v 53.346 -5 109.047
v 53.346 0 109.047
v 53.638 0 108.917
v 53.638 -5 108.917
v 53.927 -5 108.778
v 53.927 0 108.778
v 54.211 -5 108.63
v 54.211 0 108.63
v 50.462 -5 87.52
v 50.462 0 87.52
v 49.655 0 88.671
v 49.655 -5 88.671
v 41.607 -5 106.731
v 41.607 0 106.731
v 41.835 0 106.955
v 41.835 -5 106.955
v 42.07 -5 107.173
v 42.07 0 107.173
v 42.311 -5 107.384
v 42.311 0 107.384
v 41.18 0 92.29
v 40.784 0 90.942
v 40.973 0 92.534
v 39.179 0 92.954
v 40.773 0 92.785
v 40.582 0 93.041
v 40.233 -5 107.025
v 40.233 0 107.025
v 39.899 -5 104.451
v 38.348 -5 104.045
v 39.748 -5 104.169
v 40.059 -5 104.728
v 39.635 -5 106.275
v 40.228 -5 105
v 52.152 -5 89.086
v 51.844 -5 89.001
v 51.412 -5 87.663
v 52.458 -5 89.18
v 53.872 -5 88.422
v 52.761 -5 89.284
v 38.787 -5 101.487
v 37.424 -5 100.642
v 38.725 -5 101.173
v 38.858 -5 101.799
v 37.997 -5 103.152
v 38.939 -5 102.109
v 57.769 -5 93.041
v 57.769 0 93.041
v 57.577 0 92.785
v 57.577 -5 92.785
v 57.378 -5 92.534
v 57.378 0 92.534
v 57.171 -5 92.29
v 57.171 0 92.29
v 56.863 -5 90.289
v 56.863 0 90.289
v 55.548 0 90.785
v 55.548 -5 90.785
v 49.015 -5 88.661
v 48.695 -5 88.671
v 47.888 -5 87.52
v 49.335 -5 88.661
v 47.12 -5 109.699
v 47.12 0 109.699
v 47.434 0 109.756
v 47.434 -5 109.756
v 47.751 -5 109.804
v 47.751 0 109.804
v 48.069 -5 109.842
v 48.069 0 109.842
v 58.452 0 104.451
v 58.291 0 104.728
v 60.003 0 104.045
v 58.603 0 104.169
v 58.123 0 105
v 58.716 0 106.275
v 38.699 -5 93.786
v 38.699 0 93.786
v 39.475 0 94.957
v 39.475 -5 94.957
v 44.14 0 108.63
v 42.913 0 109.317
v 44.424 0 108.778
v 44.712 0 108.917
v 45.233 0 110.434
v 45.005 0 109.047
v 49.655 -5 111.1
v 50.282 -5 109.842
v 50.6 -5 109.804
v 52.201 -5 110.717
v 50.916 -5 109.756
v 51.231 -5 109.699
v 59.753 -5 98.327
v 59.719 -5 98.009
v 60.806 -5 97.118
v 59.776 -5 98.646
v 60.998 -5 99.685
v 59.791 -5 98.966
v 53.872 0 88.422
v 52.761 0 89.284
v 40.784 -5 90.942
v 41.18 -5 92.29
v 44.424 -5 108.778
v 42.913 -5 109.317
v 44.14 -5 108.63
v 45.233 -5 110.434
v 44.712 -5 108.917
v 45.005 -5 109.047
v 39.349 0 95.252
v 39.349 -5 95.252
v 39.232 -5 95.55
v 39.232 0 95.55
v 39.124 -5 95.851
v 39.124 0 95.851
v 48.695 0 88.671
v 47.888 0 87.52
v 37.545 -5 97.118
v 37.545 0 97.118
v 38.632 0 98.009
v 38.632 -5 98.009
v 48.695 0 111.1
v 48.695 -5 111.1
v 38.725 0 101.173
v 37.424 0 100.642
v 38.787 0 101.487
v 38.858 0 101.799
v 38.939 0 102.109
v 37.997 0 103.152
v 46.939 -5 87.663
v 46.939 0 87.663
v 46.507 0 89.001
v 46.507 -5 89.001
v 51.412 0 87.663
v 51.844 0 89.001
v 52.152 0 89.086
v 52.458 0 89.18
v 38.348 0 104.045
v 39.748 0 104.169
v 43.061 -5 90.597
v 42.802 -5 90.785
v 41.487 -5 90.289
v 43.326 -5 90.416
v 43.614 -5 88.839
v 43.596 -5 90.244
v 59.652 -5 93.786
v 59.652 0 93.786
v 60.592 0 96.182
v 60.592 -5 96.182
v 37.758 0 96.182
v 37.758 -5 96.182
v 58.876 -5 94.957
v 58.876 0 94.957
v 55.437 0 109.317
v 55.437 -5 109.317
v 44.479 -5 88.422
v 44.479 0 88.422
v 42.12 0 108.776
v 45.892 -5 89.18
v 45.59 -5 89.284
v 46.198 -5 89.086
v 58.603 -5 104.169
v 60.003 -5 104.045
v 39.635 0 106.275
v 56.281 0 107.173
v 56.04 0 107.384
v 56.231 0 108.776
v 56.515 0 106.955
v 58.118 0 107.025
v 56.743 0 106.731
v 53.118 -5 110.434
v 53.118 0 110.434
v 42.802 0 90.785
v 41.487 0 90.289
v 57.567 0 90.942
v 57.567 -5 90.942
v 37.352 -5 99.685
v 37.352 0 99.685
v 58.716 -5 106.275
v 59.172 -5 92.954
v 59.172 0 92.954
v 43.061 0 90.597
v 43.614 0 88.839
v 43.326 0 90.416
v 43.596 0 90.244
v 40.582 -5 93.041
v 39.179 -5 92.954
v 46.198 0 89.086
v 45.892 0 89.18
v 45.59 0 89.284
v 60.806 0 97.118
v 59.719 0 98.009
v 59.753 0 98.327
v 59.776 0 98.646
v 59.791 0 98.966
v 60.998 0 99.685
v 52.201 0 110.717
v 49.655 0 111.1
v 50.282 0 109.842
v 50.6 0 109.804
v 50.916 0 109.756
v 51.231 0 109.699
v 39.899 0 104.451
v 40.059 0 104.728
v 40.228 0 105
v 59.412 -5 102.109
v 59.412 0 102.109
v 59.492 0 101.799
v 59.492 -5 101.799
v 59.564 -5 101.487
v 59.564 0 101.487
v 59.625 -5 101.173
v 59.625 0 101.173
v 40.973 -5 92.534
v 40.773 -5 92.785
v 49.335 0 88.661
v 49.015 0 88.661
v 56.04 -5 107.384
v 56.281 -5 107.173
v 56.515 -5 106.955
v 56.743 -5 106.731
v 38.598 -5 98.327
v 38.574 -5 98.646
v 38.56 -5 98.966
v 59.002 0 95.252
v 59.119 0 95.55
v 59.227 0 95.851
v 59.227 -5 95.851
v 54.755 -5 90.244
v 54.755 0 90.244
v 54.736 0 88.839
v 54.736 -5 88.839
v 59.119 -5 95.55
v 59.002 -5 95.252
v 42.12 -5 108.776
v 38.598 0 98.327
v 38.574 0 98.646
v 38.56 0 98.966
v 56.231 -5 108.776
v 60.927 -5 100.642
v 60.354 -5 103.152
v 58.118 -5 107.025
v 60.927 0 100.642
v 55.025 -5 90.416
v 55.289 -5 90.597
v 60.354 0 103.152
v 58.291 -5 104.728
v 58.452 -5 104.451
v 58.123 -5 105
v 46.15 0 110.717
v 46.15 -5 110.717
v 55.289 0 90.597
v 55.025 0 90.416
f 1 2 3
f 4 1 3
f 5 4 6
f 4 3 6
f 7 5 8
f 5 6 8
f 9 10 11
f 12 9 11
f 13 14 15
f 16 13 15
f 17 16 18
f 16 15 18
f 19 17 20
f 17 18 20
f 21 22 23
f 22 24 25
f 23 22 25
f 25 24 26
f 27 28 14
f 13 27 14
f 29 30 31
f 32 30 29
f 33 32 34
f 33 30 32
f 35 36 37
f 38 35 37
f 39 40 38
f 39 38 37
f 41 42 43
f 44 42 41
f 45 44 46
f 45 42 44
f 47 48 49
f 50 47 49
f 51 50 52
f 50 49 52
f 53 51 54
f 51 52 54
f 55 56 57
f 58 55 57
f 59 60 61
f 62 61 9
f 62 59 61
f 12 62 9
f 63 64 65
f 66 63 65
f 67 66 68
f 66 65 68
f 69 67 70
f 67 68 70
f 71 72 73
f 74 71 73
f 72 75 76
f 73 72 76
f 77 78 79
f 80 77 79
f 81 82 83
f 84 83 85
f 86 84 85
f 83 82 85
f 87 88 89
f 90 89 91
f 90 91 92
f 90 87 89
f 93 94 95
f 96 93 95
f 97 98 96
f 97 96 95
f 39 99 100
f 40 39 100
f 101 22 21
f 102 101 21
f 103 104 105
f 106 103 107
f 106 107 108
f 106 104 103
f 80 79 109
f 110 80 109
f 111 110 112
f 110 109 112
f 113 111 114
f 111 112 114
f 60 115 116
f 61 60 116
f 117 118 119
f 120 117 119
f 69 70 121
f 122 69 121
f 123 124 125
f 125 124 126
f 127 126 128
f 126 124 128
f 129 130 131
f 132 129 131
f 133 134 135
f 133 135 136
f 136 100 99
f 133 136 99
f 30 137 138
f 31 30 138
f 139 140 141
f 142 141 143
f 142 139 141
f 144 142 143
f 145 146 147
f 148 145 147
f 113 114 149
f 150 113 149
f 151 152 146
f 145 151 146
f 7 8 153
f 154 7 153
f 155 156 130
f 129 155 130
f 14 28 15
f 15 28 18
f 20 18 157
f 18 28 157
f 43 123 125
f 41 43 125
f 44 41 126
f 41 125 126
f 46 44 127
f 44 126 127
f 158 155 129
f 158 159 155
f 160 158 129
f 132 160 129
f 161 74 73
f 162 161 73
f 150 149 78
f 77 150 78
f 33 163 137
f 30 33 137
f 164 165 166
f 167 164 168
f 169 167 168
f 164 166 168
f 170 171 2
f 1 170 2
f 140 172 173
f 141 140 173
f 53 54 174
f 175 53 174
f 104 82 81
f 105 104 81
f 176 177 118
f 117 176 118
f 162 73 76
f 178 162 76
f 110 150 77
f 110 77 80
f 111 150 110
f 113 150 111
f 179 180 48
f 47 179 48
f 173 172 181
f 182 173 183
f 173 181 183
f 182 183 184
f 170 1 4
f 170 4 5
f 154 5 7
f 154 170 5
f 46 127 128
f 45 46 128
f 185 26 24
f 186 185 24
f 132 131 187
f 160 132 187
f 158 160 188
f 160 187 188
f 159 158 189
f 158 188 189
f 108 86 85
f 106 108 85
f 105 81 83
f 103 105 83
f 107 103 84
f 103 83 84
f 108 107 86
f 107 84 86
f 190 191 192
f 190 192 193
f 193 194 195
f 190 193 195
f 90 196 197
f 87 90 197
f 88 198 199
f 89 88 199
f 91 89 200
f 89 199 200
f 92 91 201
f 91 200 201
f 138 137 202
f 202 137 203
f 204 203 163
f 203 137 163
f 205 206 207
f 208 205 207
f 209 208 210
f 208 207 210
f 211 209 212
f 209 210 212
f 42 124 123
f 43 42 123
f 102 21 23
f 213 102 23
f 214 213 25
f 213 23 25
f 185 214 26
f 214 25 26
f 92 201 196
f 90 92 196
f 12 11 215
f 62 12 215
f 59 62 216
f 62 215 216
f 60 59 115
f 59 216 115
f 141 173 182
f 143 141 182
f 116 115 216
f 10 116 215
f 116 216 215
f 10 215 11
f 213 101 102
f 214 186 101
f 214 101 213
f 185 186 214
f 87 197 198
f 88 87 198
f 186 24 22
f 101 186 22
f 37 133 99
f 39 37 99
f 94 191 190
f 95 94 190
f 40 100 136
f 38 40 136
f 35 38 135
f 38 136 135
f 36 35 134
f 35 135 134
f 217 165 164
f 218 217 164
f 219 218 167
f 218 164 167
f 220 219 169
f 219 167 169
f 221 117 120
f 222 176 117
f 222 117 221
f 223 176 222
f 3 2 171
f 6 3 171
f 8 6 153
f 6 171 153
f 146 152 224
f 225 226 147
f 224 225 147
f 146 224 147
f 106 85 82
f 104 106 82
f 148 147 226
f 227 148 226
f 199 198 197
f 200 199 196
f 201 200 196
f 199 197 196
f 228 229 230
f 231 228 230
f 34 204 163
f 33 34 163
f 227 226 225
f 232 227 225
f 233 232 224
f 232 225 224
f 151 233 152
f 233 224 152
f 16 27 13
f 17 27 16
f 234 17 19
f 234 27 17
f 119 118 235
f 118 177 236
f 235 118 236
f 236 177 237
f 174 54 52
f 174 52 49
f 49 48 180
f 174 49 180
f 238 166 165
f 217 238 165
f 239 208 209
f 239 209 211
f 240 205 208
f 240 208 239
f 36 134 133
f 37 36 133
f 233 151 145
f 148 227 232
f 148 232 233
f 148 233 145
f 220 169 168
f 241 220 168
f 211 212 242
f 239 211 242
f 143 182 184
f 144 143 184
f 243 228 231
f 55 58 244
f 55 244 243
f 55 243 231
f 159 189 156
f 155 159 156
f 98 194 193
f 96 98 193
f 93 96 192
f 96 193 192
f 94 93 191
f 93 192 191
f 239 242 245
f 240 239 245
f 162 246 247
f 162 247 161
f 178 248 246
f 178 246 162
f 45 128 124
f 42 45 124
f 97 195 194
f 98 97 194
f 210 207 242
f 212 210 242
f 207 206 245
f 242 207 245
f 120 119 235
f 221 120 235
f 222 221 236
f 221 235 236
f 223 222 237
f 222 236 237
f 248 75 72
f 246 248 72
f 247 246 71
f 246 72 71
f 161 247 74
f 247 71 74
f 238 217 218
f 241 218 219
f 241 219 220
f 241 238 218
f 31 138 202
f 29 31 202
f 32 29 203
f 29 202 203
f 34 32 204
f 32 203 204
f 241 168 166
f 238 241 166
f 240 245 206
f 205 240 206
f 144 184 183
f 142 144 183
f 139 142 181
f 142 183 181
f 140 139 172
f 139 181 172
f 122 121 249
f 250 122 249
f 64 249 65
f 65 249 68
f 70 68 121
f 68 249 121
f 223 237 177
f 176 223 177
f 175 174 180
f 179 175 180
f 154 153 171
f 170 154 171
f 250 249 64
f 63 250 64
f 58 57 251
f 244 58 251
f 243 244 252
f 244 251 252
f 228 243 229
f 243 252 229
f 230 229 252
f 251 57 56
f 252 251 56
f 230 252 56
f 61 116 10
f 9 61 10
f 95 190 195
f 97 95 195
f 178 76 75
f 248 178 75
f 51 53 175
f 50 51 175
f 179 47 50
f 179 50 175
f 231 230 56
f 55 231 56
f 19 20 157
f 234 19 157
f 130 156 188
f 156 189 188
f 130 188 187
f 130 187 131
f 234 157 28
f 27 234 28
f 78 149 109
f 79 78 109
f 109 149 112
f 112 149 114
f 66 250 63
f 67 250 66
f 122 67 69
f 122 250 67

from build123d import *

# Parameters (mm, degrees)
F1_DEPTH = 5


with BuildPart() as f1:
    # F0 (on Front) → F1 (new body)
    with BuildSketch(Plane.XZ):
        with BuildLine():
            Line((44.479217, 88.422154), (46.939013, 87.663408))
            Line((46.939013, 87.663408), (46.506944, 89.000808))
            ThreePointArc((46.506944, 89.000808), (46.04507, 89.13192), (45.589594, 89.283773))
            Line((45.589594, 89.283773), (44.479217, 88.422154))
        make_face()
        with BuildLine():
            Line((41.487418, 90.288758), (43.614287, 88.838683))
            Line((43.614287, 88.838683), (43.595619, 90.244021))
            ThreePointArc((43.595619, 90.244021), (43.192911, 90.505447), (42.80243, 90.784808))
            Line((42.80243, 90.784808), (41.487418, 90.288758))
        make_face()
        with BuildLine():
            Line((39.178726, 92.954282), (40.783688, 90.941724))
            Line((40.783688, 90.941724), (41.18008, 92.290129))
            ThreePointArc((41.18008, 92.290129), (40.87232, 92.658641), (40.58153, 93.040687))
            Line((40.58153, 93.040687), (39.178726, 92.954282))
        make_face()
        with BuildLine():
            Line((37.758281, 96.181883), (38.698726, 93.785666))
            Line((38.698726, 93.785666), (39.474957, 94.957327))
            ThreePointArc((39.474957, 94.957327), (39.289491, 95.400181), (39.12423, 95.850966))
            Line((39.12423, 95.850966), (37.758281, 96.181883))
        make_face()
        with BuildLine():
            Line((37.352293, 99.684774), (37.544661, 97.117814))
            Line((37.544661, 97.117814), (38.631759, 98.008623))
            ThreePointArc((38.631759, 98.008623), (38.585066, 98.486469), (38.560018, 98.965938))
            Line((38.560018, 98.965938), (37.352293, 99.684774))
        make_face()
        with BuildLine():
            Line((38.939027, 102.108826), (37.996839, 103.151709))
            Line((37.996839, 103.151709), (37.424034, 100.64209))
            Line((37.424034, 100.64209), (38.725407, 101.172895))
            ThreePointArc((38.725407, 101.172895), (38.821636, 101.643275), (38.939027, 102.108826))
        make_face()
        with BuildLine():
            Line((40.227579, 105.000369), (39.634645, 106.274634))
            Line((39.634645, 106.274634), (38.347566, 104.045348))
            Line((38.347566, 104.045348), (39.747579, 104.168984))
            ThreePointArc((39.747579, 104.168984), (39.97818, 104.590103), (40.227579, 105.000369))
        make_face()
        with BuildLine():
            Line((47.888291, 87.520327), (50.462449, 87.520327))
            Line((50.462449, 87.520327), (49.65537, 88.670956))
            ThreePointArc((49.65537, 88.670956), (49.17537, 88.660103), (48.69537, 88.670956))
            Line((48.69537, 88.670956), (47.888291, 87.520327))
        make_face()
        with BuildLine():
            Line((51.411727, 87.663408), (53.871523, 88.422154))
            Line((53.871523, 88.422154), (52.761146, 89.283773))
            ThreePointArc((52.761146, 89.283773), (52.30567, 89.13192), (51.843796, 89.000808))
            Line((51.843796, 89.000808), (51.411727, 87.663408))
        make_face()
        with BuildLine():
            Line((54.736453, 88.838683), (56.863322, 90.288758))
            Line((56.863322, 90.288758), (55.54831, 90.784808))
            ThreePointArc((55.54831, 90.784808), (55.157829, 90.505447), (54.755121, 90.244021))
            Line((54.755121, 90.244021), (54.736453, 88.838683))
        make_face()
        with BuildLine():
            Line((57.567052, 90.941724), (59.172014, 92.954282))
            Line((59.172014, 92.954282), (57.76921, 93.040687))
            ThreePointArc((57.76921, 93.040687), (57.47842, 92.658641), (57.17066, 92.290129))
            Line((57.17066, 92.290129), (57.567052, 90.941724))
        make_face()
        with BuildLine():
            Line((59.652014, 93.785666), (60.59246, 96.181883))
            Line((60.59246, 96.181883), (59.22651, 95.850966))
            ThreePointArc((59.22651, 95.850966), (59.061249, 95.400181), (58.875783, 94.957327))
            Line((58.875783, 94.957327), (59.652014, 93.785666))
        make_face()
        with BuildLine():
            Line((60.80608, 97.117814), (60.998447, 99.684774))
            Line((60.998447, 99.684774), (59.790722, 98.965938))
            ThreePointArc((59.790722, 98.965938), (59.765674, 98.486469), (59.718981, 98.008623))
            Line((59.718981, 98.008623), (60.80608, 97.117814))
        make_face()
        with BuildLine():
            Line((59.625334, 101.172895), (60.926706, 100.64209))
            Line((60.926706, 100.64209), (60.353902, 103.151709))
            Line((60.353902, 103.151709), (59.411714, 102.108826))
            ThreePointArc((59.411714, 102.108826), (59.529105, 101.643275), (59.625334, 101.172895))
        make_face()
        with BuildLine():
            Line((58.603161, 104.168984), (60.003174, 104.045348))
            Line((60.003174, 104.045348), (58.716095, 106.274634))
            Line((58.716095, 106.274634), (58.123161, 105.000369))
            ThreePointArc((58.123161, 105.000369), (58.37256, 104.590103), (58.603161, 104.168984))
        make_face()
        with BuildLine():
            Line((56.743288, 106.730675), (58.117545, 107.025192))
            Line((58.117545, 107.025192), (56.230553, 108.776065))
            Line((56.230553, 108.776065), (56.039558, 107.383641))
            ThreePointArc((56.039558, 107.383641), (56.398805, 107.065114), (56.743288, 106.730675))
        make_face()
        with BuildLine():
            Line((54.210972, 108.63035), (55.437364, 109.316852))
            Line((55.437364, 109.316852), (53.118127, 110.433738))
            Line((53.118127, 110.433738), (53.346041, 109.046878))
            ThreePointArc((53.346041, 109.046878), (53.783215, 108.848392), (54.210972, 108.63035))
        make_face()
        with BuildLine():
            Line((51.23122, 109.699214), (52.200777, 110.716703))
            Line((52.200777, 110.716703), (49.65537, 111.100361))
            Line((49.65537, 111.100361), (50.281943, 109.842295))
            ThreePointArc((50.281943, 109.842295), (50.758199, 109.781486), (51.23122, 109.699214))
        make_face()
        with BuildLine():
            Line((42.311182, 107.383641), (42.120187, 108.776065))
            Line((42.120187, 108.776065), (40.233195, 107.025192))
            Line((40.233195, 107.025192), (41.607453, 106.730675))
            ThreePointArc((41.607453, 106.730675), (41.951936, 107.065114), (42.311182, 107.383641))
        make_face()
        with BuildLine():
            Line((45.004699, 109.046878), (45.232613, 110.433738))
            Line((45.232613, 110.433738), (42.913376, 109.316852))
            Line((42.913376, 109.316852), (44.139769, 108.63035))
            ThreePointArc((44.139769, 108.63035), (44.567525, 108.848392), (45.004699, 109.046878))
        make_face()
        with BuildLine():
            Line((48.068798, 109.842295), (48.69537, 111.100361))
            Line((48.69537, 111.100361), (46.149963, 110.716703))
            Line((46.149963, 110.716703), (47.11952, 109.699214))
            ThreePointArc((47.11952, 109.699214), (47.592541, 109.781486), (48.068798, 109.842295))
        make_face()
    extrude(amount=F1_DEPTH)


solid = f1.part
